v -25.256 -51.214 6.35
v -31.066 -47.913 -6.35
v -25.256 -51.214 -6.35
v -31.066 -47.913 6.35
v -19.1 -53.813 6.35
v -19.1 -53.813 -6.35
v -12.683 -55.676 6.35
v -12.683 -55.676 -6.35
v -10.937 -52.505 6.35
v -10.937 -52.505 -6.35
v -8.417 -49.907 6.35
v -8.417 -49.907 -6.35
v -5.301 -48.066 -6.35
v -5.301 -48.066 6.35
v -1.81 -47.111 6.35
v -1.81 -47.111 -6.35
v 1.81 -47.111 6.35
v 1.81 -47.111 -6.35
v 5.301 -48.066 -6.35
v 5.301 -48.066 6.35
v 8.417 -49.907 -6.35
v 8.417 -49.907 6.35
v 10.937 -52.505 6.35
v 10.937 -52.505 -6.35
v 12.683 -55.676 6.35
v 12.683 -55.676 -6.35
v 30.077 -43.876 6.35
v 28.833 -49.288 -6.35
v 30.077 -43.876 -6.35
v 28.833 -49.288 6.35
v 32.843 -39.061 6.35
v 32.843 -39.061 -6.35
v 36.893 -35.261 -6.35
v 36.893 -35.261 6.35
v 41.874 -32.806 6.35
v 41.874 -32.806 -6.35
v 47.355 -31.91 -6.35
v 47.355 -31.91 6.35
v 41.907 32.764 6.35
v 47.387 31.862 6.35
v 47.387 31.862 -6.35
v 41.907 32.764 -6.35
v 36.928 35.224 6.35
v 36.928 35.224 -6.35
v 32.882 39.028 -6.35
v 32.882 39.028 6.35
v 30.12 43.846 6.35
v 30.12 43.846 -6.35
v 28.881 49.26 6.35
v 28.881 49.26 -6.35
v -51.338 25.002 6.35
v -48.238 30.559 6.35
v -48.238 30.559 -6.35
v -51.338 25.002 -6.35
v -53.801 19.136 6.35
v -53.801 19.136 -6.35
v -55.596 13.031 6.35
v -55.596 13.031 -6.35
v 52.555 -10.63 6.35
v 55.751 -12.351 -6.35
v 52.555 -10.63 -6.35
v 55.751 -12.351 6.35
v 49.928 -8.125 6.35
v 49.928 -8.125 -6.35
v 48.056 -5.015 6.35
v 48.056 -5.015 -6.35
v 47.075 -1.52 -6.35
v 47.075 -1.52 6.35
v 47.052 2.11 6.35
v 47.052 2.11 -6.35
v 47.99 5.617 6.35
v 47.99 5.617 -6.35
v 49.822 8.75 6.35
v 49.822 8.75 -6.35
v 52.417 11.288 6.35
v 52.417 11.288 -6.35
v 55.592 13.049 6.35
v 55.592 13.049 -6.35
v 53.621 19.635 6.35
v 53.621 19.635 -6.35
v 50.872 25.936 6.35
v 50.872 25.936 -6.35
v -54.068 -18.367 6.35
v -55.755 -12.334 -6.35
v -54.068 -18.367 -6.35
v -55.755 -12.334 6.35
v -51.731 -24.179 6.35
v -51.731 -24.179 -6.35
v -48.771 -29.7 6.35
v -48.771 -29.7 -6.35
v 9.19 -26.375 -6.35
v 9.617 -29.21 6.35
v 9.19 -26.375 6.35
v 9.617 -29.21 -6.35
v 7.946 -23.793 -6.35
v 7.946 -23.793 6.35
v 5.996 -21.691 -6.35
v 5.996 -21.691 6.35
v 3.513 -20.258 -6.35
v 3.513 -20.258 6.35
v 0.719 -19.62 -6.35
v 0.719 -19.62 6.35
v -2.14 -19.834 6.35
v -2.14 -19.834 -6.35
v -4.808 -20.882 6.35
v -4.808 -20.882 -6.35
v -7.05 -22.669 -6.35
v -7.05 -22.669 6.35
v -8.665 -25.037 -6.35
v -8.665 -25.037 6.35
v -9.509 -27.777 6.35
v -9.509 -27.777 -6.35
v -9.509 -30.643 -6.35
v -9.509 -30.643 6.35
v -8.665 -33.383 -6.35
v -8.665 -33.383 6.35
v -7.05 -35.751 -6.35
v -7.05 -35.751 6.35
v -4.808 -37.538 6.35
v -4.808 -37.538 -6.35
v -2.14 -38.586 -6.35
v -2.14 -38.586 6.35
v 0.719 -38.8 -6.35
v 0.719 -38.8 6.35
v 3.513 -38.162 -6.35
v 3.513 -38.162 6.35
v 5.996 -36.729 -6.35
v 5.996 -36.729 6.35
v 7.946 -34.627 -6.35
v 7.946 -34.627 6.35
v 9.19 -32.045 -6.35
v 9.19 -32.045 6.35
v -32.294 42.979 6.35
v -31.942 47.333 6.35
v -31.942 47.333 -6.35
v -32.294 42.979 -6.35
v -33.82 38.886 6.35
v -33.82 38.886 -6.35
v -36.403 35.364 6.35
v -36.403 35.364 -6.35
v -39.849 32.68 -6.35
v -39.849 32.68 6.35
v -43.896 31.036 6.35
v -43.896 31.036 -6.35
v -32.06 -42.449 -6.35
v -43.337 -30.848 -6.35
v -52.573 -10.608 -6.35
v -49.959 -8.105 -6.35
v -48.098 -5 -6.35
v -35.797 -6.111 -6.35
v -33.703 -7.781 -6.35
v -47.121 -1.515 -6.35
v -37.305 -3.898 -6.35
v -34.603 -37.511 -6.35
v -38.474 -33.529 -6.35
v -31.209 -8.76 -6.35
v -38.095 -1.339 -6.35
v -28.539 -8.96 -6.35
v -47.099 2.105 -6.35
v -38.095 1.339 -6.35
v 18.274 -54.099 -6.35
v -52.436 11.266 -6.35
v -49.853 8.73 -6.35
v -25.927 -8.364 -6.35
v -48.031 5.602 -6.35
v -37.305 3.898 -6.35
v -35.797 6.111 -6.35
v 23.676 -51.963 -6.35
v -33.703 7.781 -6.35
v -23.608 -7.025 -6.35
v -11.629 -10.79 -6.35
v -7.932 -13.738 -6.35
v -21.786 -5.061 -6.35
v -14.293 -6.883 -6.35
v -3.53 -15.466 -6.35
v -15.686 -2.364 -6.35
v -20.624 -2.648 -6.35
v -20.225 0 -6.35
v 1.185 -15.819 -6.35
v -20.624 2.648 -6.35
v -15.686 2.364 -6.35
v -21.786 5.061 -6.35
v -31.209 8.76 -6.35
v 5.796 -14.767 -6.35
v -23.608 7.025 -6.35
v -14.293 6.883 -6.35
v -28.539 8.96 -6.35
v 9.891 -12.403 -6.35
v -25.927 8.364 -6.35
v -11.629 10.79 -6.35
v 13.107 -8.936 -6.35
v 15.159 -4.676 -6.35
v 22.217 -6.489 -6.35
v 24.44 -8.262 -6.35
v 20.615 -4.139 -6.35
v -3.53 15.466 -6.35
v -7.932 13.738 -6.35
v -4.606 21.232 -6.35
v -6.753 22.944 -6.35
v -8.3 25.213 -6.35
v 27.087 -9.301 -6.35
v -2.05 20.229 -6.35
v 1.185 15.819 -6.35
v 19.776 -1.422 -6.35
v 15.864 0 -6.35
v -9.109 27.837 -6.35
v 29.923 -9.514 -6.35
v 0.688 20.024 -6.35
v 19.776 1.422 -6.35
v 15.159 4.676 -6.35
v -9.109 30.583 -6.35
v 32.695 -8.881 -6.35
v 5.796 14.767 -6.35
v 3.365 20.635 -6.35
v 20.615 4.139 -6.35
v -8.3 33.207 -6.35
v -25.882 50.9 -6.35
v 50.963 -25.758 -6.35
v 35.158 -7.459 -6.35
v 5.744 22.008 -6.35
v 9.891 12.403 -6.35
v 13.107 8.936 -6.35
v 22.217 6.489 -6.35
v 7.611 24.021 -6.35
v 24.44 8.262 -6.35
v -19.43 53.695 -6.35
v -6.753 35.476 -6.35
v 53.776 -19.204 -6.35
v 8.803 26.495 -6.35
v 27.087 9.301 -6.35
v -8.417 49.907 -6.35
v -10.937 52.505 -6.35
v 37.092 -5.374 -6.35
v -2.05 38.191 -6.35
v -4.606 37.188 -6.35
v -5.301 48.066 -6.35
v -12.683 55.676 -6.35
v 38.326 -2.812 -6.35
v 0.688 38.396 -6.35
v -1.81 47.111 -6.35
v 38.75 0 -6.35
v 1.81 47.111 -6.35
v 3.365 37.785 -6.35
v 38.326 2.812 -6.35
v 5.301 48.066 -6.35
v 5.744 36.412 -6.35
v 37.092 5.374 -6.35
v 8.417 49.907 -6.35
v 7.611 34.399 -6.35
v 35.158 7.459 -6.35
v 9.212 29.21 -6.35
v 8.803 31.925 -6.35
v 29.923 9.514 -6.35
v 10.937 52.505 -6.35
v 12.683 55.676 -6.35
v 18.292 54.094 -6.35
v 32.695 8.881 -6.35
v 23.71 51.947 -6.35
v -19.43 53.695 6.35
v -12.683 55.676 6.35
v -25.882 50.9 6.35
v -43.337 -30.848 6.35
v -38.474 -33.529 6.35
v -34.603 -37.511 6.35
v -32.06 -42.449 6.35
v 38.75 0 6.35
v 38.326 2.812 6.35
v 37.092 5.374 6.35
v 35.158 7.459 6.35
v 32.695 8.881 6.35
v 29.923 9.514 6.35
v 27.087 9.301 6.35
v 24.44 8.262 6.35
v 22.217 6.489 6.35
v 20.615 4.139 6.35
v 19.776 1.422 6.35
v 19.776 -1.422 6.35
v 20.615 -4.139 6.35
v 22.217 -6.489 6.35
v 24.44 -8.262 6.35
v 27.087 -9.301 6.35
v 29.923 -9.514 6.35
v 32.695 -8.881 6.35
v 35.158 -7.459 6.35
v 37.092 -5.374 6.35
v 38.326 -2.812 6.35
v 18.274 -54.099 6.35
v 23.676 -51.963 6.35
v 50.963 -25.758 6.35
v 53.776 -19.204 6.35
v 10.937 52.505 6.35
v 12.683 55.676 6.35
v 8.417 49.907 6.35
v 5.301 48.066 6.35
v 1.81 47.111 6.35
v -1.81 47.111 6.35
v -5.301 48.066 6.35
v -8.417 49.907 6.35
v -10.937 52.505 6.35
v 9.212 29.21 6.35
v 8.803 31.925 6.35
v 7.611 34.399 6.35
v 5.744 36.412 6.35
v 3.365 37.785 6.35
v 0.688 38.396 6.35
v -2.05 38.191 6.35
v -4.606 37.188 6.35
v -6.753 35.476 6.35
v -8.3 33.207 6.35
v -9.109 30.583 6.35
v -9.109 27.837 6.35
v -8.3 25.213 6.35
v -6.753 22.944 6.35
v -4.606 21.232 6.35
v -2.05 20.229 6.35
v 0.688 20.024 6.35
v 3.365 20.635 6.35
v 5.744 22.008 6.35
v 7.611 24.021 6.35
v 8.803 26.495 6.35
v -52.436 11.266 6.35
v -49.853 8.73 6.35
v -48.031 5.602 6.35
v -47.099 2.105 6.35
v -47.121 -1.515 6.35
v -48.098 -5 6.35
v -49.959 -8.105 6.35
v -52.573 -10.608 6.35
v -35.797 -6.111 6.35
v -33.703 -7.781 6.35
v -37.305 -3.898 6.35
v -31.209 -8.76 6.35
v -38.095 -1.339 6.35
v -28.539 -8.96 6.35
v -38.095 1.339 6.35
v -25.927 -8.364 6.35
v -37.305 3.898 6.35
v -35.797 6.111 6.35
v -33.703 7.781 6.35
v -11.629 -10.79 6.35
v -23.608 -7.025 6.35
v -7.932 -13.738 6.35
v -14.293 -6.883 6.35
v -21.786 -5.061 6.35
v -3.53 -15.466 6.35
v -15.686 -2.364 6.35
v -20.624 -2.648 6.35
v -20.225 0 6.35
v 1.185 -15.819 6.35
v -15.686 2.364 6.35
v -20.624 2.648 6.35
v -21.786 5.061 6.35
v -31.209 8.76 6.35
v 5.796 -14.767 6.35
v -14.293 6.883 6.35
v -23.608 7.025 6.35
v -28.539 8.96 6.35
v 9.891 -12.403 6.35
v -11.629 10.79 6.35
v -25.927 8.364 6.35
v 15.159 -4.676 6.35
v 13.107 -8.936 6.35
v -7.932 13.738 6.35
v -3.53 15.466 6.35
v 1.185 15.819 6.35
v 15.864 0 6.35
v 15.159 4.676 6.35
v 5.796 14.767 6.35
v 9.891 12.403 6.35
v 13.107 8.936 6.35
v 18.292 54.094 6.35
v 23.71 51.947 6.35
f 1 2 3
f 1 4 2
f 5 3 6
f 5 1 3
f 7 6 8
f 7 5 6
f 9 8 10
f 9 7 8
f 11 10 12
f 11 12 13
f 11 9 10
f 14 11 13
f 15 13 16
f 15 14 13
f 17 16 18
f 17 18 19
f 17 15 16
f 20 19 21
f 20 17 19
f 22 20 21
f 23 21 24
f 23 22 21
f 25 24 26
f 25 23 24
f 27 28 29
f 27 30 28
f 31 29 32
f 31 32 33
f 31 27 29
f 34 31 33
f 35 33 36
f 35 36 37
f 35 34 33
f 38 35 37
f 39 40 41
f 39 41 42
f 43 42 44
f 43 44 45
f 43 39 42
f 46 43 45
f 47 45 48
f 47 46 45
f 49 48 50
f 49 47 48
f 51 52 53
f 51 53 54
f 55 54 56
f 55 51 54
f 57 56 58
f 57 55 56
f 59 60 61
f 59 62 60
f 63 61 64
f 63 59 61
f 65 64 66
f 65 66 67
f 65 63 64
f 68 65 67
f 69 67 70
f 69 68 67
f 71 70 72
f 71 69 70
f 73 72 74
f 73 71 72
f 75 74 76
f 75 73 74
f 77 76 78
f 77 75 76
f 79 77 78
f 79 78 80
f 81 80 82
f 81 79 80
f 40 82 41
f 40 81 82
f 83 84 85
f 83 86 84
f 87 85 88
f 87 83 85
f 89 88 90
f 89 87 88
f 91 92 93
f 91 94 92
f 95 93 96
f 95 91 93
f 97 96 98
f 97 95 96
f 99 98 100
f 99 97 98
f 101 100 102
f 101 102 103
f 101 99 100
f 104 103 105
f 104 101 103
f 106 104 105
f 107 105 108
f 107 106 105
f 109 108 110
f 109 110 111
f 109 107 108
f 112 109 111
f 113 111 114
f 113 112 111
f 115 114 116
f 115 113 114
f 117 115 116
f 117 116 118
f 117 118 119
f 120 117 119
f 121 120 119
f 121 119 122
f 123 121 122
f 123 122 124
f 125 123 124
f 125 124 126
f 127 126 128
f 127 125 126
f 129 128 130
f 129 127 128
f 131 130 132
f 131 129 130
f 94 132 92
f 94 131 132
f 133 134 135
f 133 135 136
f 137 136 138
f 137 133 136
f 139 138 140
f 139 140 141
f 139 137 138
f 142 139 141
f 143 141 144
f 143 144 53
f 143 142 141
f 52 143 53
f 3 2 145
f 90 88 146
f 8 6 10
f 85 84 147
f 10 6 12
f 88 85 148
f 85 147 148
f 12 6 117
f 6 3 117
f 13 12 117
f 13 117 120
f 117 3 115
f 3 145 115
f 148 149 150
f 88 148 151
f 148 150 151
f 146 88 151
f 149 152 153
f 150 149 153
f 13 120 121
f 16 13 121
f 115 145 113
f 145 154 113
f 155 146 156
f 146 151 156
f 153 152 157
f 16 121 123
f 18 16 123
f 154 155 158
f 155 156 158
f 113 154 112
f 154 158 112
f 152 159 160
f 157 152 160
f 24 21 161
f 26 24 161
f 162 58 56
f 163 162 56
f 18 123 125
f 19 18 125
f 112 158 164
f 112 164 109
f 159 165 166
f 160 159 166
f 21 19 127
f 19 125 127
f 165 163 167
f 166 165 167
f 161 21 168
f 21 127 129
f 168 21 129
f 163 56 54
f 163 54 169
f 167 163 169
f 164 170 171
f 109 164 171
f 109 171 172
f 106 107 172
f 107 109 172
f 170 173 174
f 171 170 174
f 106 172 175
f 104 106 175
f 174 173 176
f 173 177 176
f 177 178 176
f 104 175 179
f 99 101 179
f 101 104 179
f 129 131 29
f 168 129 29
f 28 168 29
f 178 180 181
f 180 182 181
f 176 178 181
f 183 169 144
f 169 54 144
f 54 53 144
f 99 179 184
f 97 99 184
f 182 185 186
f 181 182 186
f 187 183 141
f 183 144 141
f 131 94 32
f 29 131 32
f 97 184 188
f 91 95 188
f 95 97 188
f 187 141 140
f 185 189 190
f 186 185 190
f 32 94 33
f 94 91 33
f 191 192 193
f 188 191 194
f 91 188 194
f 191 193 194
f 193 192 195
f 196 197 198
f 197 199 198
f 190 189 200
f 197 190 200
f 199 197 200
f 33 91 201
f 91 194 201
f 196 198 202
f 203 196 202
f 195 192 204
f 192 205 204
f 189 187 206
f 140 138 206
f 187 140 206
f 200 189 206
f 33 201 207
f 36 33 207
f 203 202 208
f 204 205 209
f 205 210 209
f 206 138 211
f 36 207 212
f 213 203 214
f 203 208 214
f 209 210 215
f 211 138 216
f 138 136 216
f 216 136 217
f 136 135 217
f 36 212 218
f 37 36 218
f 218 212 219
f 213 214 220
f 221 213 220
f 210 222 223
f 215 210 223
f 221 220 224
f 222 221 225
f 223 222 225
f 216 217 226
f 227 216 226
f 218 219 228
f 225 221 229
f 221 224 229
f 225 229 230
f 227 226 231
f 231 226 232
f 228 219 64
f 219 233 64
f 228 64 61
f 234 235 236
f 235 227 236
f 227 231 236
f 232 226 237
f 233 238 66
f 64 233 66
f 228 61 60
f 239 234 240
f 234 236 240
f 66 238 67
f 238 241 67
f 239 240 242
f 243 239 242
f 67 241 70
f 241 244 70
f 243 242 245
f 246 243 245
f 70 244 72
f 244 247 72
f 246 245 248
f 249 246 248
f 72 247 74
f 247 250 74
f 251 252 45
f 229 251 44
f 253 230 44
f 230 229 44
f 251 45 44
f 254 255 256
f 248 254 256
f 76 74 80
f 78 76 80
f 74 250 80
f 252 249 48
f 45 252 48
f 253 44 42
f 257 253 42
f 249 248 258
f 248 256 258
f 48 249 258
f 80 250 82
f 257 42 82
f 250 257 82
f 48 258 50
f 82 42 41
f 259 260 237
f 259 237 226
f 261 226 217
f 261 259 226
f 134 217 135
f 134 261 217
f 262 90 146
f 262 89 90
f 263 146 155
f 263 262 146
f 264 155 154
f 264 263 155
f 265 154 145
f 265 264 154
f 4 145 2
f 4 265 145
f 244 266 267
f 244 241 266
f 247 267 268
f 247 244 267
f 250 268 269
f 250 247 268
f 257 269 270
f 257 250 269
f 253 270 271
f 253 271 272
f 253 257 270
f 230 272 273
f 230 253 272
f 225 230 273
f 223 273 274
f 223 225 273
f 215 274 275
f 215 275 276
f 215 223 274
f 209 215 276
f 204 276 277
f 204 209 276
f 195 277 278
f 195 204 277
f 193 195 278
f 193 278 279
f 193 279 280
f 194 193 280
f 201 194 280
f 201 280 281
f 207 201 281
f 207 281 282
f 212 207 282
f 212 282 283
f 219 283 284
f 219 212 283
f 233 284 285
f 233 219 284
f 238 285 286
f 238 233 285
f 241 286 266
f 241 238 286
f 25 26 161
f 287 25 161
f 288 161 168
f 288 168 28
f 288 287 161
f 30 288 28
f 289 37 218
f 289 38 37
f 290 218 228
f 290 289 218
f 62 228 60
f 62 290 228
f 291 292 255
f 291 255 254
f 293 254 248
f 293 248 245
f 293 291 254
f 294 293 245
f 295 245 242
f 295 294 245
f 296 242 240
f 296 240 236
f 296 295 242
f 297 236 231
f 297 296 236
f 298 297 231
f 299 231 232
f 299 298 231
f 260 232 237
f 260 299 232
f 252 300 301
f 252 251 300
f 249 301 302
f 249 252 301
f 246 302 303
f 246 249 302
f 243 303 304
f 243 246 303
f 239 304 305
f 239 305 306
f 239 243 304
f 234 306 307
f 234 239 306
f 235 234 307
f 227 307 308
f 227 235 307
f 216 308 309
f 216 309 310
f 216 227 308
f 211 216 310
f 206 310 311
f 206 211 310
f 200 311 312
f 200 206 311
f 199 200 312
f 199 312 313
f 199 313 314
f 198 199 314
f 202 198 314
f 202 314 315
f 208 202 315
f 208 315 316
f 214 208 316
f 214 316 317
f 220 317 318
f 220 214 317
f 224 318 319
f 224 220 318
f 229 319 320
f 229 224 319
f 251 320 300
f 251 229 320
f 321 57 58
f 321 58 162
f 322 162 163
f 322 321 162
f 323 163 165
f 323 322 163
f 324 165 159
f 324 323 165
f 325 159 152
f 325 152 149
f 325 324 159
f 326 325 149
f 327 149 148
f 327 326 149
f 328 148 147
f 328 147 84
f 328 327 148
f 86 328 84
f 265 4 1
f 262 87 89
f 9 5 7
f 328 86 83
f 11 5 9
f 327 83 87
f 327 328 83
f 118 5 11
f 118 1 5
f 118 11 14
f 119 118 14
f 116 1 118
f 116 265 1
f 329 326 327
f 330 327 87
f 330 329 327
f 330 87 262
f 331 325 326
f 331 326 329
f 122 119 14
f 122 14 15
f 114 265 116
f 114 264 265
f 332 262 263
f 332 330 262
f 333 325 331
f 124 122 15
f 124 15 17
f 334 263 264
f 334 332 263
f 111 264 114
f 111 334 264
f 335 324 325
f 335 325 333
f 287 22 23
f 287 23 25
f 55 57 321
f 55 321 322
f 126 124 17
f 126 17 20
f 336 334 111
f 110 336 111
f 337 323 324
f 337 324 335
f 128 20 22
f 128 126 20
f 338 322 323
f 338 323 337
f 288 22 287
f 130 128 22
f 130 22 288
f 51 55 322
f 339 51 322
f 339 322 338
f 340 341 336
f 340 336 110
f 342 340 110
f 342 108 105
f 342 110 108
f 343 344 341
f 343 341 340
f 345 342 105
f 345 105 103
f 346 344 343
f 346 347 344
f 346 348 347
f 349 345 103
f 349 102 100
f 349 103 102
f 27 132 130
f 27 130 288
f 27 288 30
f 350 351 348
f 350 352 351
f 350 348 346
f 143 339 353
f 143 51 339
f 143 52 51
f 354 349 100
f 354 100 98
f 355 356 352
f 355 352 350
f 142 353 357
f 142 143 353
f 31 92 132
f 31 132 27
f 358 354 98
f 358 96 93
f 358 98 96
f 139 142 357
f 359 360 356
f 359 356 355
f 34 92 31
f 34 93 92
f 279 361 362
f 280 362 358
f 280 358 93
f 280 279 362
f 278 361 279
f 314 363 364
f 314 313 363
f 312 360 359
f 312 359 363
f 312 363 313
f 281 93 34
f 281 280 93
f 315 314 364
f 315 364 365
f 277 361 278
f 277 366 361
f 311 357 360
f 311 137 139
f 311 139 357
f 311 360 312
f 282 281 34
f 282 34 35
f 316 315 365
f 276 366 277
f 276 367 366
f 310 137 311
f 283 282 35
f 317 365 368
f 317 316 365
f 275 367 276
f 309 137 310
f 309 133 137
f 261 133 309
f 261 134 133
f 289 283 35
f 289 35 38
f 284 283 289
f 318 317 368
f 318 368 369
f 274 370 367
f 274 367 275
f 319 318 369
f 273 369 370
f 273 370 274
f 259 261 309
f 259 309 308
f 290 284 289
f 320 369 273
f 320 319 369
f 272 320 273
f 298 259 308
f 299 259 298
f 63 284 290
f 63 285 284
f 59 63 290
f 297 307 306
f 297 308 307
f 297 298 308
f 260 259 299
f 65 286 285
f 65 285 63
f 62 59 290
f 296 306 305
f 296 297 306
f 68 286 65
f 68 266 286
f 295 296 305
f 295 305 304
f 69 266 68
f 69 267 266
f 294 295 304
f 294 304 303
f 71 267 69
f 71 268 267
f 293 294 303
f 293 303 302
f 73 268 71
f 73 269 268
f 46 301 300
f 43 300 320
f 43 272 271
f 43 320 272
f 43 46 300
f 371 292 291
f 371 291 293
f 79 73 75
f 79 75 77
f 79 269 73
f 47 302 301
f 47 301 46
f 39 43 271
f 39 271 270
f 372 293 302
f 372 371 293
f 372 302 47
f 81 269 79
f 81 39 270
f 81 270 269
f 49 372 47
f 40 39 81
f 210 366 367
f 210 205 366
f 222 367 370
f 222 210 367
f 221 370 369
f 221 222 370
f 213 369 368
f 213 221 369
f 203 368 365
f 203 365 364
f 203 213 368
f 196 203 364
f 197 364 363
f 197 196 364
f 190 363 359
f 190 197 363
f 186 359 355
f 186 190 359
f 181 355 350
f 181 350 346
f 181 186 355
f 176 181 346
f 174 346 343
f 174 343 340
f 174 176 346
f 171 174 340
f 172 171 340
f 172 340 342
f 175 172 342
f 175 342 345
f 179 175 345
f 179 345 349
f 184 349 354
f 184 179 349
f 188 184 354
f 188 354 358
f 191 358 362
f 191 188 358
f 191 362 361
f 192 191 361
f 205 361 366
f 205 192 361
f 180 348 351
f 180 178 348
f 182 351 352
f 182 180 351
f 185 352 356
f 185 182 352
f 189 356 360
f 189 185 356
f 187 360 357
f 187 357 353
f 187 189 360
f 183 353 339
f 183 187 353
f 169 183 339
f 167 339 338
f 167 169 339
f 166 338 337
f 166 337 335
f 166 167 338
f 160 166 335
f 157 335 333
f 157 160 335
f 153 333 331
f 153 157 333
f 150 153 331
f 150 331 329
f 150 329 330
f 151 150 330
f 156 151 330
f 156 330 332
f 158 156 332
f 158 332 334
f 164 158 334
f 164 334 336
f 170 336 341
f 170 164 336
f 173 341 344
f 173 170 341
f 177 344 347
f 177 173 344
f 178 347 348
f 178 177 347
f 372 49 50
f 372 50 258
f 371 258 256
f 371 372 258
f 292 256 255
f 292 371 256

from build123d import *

# Parameters (mm, degrees)
F0_R     = 9.616889
F0_R_2   = 8.985077
F0_R_3   = 15.863609
F0_R_4   = 9.540201
F0_R_5   = 9.211903
F1_DEPTH = 6.35


with BuildPart() as f1:
    # F0 (on Top) → F1 (new body, symmetric)
    with BuildSketch(Plane.XY):
        with BuildLine():
            ThreePointArc((55.750749, -12.350976), (46.941552, 0.294295), (55.591506, 13.049024))
            ThreePointArc((55.591506, 13.049024), (52.341403, 22.826962), (47.387013, 31.861632))
            ThreePointArc((47.387013, 31.861632), (34.764291, 36.976449), (28.881476, 49.260054))
            ThreePointArc((28.881476, 49.260054), (21.028254, 53.089595), (12.682723, 55.676217))
            ThreePointArc((12.682723, 55.676217), (0, 46.99), (-12.682723, 55.676217))
            ThreePointArc((-12.682723, 55.676217), (-22.699262, 52.396909), (-31.942484, 47.33255))
            ThreePointArc((-31.942484, 47.33255), (-36.40324, 35.364075), (-48.237544, 30.558664))
            ThreePointArc((-48.237544, 30.558664), (-52.651044, 22.103398), (-55.595625, 13.031466))
            ThreePointArc((-55.595625, 13.031466), (-46.989078, 0.294335), (-55.754511, -12.333979))
            ThreePointArc((-55.754511, -12.333979), (-52.979063, -21.305198), (-48.770789, -29.700214))
            ThreePointArc((-48.770789, -29.700214), (-36.390639, -35.377041), (-31.065705, -47.912572))
            ThreePointArc((-31.065705, -47.912572), (-22.21598, -52.603639), (-12.682723, -55.676217))
            ThreePointArc((-12.682723, -55.676217), (0, -46.99), (12.682723, -55.676217))
            ThreePointArc((12.682723, -55.676217), (21.002263, -53.099882), (28.833236, -49.288306))
            ThreePointArc((28.833236, -49.288306), (34.727362, -37.011133), (47.354571, -31.90983))
            ThreePointArc((47.354571, -31.90983), (52.47203, -22.525068), (55.750749, -12.350976))
        make_face()
        with Locations((0, -29.21)):
            Circle(F0_R, mode=Mode.SUBTRACT)
        with Locations((-29.21, 0)):
            Circle(F0_R_2, mode=Mode.SUBTRACT)
        Circle(F0_R_3, mode=Mode.SUBTRACT)
        with Locations((29.21, 0)):
            Circle(F0_R_4, mode=Mode.SUBTRACT)
        with Locations((0, 29.21)):
            Circle(F0_R_5, mode=Mode.SUBTRACT)
    extrude(amount=F1_DEPTH, both=True)


solid = f1.part
